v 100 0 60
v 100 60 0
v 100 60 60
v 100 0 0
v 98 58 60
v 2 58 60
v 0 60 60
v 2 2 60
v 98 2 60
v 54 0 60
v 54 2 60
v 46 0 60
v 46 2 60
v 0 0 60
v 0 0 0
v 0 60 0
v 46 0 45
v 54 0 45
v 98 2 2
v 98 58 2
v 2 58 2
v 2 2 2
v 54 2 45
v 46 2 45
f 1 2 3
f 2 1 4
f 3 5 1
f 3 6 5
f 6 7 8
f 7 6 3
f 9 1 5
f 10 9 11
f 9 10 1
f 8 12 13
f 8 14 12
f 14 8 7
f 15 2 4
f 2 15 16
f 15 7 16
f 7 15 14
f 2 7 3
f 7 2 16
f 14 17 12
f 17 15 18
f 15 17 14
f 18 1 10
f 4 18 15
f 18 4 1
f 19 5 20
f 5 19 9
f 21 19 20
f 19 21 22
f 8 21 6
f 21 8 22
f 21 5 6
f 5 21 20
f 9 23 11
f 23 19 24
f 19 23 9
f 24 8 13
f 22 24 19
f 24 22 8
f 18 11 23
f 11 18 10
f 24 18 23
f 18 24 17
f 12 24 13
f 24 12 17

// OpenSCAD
$fn = 32;

// ----------------------------------------------------------------------
// Enclosure box: notch enclosure
// ----------------------------------------------------------------------

// --- parameters (mm) ---
box_l = 100;              // outer length, X
box_w = 60;               // outer width, Y
box_h = 60;               // outer height
wall_t = 2;               // wall thickness
notch_w = 8;              // cable notch width
notch_h = 15;             // cable notch height
fit_tol = 0.05;           // tolerance for press fits, mm
free_tol = 0.3;           // tolerance for clearance fits, mm

inner_h = box_h - wall_t;  // cavity depth
boss_h = inner_h - 2;  // corner boss height

difference() {
  union() {
    difference() {
      cube([box_l, box_w, box_h]);
      translate([wall_t, wall_t, wall_t])
        cube([box_l - 2 * wall_t, box_w - 2 * wall_t, box_h]);
    }
  }
  translate([box_l / 2 - notch_w / 2, -1, box_h - notch_h])
    cube([notch_w, wall_t + 2, notch_h + 1]);
}
